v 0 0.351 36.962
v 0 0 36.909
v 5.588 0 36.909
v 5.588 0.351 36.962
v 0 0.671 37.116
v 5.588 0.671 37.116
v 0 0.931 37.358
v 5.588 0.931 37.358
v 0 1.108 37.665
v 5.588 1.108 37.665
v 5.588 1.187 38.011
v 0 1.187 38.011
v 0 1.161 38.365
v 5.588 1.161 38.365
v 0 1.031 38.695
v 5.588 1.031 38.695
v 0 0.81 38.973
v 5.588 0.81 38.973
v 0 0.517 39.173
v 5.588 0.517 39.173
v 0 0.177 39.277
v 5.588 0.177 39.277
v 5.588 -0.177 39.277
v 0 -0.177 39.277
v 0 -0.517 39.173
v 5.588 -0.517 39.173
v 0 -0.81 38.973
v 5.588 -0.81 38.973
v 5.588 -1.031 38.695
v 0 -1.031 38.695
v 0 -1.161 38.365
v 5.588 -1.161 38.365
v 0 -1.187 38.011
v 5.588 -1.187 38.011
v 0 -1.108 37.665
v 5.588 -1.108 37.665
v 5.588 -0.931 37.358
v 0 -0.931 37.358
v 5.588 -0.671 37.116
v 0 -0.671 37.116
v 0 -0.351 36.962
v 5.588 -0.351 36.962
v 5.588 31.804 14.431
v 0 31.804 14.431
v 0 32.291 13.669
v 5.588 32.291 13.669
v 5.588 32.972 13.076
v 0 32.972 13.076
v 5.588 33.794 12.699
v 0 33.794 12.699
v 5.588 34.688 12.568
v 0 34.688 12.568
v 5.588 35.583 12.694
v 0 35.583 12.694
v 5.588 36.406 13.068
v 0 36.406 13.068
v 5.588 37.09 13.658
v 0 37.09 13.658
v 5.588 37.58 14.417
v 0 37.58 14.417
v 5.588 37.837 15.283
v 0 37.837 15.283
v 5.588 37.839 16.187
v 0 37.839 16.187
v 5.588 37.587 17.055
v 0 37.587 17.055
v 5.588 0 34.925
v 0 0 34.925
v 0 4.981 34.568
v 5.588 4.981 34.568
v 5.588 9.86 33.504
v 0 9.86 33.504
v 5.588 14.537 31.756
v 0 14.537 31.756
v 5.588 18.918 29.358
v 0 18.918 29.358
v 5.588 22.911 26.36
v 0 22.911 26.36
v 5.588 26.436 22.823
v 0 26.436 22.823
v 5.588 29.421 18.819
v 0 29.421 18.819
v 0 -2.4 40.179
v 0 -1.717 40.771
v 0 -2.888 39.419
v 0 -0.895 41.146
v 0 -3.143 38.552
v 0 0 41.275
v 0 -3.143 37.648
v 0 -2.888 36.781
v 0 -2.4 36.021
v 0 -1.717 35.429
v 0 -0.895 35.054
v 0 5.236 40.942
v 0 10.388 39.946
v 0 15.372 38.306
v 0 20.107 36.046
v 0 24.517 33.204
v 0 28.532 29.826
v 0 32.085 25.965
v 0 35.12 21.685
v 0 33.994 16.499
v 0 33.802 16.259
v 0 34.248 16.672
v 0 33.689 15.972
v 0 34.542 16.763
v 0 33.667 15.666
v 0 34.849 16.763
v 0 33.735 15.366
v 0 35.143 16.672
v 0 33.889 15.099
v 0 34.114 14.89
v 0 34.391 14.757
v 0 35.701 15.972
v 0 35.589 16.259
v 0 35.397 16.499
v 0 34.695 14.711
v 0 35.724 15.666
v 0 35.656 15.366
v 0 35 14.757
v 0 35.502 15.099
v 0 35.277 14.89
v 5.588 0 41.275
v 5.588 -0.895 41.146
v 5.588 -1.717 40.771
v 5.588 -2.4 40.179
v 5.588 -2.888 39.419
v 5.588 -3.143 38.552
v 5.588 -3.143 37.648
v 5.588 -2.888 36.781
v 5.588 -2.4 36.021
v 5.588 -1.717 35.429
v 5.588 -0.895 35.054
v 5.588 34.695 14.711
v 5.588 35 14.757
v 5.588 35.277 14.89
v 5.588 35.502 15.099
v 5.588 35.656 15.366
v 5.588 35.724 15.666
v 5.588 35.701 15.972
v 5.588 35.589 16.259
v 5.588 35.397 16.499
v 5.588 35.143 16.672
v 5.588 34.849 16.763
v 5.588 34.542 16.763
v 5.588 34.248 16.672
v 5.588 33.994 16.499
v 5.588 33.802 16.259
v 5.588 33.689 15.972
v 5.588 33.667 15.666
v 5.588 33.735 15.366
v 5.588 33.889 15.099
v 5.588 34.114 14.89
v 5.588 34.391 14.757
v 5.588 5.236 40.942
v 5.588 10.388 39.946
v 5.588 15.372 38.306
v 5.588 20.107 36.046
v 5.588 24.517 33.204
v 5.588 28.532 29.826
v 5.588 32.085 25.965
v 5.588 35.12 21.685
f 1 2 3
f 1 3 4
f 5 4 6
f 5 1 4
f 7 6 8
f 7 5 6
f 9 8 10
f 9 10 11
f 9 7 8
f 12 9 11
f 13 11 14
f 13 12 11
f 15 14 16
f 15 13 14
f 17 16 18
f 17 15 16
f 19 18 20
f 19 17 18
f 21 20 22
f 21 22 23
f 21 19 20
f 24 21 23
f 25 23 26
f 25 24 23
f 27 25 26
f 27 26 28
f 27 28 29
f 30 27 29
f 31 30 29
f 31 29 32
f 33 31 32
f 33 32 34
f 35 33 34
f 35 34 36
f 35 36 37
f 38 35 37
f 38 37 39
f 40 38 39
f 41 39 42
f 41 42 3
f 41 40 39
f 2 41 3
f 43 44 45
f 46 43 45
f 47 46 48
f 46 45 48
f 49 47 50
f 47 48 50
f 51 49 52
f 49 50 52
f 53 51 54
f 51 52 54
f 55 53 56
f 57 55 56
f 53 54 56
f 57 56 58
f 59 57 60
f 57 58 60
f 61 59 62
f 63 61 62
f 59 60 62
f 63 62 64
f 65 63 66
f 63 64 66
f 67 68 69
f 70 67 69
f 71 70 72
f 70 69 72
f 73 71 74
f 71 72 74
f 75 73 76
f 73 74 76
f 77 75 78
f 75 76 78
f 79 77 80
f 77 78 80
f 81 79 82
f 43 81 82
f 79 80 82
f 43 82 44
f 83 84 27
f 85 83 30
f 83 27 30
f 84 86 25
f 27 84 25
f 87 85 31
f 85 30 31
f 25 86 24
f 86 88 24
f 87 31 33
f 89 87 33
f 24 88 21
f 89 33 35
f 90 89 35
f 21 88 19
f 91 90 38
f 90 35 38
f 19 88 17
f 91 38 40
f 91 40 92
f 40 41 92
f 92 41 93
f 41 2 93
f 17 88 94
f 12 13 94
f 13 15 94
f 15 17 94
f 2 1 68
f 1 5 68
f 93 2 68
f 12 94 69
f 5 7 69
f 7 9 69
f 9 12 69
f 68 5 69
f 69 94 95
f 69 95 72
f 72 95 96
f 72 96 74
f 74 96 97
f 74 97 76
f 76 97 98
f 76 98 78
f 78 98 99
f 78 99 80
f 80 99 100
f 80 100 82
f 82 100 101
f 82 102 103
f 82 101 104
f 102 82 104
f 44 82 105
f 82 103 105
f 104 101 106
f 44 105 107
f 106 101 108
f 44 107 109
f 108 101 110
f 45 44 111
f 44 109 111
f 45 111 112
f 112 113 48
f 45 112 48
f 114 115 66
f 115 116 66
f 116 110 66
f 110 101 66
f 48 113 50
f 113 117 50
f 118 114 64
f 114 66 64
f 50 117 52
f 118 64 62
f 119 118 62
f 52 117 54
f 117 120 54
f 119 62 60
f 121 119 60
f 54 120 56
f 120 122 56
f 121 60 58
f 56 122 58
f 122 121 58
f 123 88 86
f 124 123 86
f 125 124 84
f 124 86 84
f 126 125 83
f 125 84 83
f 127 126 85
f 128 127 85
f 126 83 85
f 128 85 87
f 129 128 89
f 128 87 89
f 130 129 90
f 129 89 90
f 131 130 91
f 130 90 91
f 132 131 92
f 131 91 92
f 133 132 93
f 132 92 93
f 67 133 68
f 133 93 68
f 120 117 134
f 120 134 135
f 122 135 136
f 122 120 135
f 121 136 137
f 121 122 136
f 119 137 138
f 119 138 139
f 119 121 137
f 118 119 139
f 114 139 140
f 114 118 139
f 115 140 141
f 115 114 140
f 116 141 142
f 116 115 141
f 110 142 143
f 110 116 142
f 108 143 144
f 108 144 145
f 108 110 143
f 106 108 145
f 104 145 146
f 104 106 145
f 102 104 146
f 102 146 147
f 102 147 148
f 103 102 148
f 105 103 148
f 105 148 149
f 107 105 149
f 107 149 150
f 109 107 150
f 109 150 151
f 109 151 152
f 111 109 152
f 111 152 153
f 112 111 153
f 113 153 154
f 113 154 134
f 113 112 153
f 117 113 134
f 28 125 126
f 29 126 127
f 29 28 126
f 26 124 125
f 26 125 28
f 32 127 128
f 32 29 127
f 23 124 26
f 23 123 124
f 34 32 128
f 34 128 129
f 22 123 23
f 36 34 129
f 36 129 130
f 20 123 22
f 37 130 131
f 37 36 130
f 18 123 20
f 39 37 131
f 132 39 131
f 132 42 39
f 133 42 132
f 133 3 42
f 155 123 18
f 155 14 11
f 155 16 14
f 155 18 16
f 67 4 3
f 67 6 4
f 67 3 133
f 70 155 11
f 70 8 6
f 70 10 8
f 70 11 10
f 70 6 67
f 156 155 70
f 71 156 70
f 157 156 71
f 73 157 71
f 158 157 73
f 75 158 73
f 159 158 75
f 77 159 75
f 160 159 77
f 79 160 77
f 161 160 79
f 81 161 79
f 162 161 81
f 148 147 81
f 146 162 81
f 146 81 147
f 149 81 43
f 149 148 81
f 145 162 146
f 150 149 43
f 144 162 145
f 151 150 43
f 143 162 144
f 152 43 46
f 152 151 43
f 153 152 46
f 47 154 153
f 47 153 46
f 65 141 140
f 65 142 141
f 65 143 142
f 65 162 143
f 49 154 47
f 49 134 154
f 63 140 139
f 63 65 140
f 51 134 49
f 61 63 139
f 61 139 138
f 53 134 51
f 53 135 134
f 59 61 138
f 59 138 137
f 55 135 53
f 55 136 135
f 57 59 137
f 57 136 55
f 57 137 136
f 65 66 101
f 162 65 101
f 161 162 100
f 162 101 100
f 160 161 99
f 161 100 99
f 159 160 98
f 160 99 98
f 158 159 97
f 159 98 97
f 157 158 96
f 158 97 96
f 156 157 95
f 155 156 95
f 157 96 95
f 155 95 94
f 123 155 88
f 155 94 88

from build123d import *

# Parameters (mm, degrees)
ESQUISSE1_R        = 1.190625
ESQUISSE1_R_2      = 1.031875
BOSS_EXTRU_1_DEPTH = 5.588


with BuildPart() as part:
    # Esquisse1 → Boss.-Extru.1 (new body)
    with BuildSketch(Plane(origin=(0, 0, 0), x_dir=(0, 0, -1), z_dir=(1, 0, 0))):
        with BuildLine():
            ThreePointArc((-34.925, 0), (-29.357723625, 18.917708333), (-14.430815972, 31.804200593))
            ThreePointArc((-14.430815972, 31.804200593), (-12.85141737, 36.007383917), (-17.054600694, 37.586782519))
            ThreePointArc((-17.054600694, 37.586782519), (-34.695491556, 22.357291667), (-41.275, 0))
            ThreePointArc((-41.275, 0), (-38.1, -3.175), (-34.925, 0))
        make_face()
        with Locations((-38.1, 0)):
            Circle(ESQUISSE1_R, mode=Mode.SUBTRACT)
        with Locations((-15.742708333, 34.695491556)):
            Circle(ESQUISSE1_R_2, mode=Mode.SUBTRACT)
    extrude(amount=BOSS_EXTRU_1_DEPTH)


solid = part.part
